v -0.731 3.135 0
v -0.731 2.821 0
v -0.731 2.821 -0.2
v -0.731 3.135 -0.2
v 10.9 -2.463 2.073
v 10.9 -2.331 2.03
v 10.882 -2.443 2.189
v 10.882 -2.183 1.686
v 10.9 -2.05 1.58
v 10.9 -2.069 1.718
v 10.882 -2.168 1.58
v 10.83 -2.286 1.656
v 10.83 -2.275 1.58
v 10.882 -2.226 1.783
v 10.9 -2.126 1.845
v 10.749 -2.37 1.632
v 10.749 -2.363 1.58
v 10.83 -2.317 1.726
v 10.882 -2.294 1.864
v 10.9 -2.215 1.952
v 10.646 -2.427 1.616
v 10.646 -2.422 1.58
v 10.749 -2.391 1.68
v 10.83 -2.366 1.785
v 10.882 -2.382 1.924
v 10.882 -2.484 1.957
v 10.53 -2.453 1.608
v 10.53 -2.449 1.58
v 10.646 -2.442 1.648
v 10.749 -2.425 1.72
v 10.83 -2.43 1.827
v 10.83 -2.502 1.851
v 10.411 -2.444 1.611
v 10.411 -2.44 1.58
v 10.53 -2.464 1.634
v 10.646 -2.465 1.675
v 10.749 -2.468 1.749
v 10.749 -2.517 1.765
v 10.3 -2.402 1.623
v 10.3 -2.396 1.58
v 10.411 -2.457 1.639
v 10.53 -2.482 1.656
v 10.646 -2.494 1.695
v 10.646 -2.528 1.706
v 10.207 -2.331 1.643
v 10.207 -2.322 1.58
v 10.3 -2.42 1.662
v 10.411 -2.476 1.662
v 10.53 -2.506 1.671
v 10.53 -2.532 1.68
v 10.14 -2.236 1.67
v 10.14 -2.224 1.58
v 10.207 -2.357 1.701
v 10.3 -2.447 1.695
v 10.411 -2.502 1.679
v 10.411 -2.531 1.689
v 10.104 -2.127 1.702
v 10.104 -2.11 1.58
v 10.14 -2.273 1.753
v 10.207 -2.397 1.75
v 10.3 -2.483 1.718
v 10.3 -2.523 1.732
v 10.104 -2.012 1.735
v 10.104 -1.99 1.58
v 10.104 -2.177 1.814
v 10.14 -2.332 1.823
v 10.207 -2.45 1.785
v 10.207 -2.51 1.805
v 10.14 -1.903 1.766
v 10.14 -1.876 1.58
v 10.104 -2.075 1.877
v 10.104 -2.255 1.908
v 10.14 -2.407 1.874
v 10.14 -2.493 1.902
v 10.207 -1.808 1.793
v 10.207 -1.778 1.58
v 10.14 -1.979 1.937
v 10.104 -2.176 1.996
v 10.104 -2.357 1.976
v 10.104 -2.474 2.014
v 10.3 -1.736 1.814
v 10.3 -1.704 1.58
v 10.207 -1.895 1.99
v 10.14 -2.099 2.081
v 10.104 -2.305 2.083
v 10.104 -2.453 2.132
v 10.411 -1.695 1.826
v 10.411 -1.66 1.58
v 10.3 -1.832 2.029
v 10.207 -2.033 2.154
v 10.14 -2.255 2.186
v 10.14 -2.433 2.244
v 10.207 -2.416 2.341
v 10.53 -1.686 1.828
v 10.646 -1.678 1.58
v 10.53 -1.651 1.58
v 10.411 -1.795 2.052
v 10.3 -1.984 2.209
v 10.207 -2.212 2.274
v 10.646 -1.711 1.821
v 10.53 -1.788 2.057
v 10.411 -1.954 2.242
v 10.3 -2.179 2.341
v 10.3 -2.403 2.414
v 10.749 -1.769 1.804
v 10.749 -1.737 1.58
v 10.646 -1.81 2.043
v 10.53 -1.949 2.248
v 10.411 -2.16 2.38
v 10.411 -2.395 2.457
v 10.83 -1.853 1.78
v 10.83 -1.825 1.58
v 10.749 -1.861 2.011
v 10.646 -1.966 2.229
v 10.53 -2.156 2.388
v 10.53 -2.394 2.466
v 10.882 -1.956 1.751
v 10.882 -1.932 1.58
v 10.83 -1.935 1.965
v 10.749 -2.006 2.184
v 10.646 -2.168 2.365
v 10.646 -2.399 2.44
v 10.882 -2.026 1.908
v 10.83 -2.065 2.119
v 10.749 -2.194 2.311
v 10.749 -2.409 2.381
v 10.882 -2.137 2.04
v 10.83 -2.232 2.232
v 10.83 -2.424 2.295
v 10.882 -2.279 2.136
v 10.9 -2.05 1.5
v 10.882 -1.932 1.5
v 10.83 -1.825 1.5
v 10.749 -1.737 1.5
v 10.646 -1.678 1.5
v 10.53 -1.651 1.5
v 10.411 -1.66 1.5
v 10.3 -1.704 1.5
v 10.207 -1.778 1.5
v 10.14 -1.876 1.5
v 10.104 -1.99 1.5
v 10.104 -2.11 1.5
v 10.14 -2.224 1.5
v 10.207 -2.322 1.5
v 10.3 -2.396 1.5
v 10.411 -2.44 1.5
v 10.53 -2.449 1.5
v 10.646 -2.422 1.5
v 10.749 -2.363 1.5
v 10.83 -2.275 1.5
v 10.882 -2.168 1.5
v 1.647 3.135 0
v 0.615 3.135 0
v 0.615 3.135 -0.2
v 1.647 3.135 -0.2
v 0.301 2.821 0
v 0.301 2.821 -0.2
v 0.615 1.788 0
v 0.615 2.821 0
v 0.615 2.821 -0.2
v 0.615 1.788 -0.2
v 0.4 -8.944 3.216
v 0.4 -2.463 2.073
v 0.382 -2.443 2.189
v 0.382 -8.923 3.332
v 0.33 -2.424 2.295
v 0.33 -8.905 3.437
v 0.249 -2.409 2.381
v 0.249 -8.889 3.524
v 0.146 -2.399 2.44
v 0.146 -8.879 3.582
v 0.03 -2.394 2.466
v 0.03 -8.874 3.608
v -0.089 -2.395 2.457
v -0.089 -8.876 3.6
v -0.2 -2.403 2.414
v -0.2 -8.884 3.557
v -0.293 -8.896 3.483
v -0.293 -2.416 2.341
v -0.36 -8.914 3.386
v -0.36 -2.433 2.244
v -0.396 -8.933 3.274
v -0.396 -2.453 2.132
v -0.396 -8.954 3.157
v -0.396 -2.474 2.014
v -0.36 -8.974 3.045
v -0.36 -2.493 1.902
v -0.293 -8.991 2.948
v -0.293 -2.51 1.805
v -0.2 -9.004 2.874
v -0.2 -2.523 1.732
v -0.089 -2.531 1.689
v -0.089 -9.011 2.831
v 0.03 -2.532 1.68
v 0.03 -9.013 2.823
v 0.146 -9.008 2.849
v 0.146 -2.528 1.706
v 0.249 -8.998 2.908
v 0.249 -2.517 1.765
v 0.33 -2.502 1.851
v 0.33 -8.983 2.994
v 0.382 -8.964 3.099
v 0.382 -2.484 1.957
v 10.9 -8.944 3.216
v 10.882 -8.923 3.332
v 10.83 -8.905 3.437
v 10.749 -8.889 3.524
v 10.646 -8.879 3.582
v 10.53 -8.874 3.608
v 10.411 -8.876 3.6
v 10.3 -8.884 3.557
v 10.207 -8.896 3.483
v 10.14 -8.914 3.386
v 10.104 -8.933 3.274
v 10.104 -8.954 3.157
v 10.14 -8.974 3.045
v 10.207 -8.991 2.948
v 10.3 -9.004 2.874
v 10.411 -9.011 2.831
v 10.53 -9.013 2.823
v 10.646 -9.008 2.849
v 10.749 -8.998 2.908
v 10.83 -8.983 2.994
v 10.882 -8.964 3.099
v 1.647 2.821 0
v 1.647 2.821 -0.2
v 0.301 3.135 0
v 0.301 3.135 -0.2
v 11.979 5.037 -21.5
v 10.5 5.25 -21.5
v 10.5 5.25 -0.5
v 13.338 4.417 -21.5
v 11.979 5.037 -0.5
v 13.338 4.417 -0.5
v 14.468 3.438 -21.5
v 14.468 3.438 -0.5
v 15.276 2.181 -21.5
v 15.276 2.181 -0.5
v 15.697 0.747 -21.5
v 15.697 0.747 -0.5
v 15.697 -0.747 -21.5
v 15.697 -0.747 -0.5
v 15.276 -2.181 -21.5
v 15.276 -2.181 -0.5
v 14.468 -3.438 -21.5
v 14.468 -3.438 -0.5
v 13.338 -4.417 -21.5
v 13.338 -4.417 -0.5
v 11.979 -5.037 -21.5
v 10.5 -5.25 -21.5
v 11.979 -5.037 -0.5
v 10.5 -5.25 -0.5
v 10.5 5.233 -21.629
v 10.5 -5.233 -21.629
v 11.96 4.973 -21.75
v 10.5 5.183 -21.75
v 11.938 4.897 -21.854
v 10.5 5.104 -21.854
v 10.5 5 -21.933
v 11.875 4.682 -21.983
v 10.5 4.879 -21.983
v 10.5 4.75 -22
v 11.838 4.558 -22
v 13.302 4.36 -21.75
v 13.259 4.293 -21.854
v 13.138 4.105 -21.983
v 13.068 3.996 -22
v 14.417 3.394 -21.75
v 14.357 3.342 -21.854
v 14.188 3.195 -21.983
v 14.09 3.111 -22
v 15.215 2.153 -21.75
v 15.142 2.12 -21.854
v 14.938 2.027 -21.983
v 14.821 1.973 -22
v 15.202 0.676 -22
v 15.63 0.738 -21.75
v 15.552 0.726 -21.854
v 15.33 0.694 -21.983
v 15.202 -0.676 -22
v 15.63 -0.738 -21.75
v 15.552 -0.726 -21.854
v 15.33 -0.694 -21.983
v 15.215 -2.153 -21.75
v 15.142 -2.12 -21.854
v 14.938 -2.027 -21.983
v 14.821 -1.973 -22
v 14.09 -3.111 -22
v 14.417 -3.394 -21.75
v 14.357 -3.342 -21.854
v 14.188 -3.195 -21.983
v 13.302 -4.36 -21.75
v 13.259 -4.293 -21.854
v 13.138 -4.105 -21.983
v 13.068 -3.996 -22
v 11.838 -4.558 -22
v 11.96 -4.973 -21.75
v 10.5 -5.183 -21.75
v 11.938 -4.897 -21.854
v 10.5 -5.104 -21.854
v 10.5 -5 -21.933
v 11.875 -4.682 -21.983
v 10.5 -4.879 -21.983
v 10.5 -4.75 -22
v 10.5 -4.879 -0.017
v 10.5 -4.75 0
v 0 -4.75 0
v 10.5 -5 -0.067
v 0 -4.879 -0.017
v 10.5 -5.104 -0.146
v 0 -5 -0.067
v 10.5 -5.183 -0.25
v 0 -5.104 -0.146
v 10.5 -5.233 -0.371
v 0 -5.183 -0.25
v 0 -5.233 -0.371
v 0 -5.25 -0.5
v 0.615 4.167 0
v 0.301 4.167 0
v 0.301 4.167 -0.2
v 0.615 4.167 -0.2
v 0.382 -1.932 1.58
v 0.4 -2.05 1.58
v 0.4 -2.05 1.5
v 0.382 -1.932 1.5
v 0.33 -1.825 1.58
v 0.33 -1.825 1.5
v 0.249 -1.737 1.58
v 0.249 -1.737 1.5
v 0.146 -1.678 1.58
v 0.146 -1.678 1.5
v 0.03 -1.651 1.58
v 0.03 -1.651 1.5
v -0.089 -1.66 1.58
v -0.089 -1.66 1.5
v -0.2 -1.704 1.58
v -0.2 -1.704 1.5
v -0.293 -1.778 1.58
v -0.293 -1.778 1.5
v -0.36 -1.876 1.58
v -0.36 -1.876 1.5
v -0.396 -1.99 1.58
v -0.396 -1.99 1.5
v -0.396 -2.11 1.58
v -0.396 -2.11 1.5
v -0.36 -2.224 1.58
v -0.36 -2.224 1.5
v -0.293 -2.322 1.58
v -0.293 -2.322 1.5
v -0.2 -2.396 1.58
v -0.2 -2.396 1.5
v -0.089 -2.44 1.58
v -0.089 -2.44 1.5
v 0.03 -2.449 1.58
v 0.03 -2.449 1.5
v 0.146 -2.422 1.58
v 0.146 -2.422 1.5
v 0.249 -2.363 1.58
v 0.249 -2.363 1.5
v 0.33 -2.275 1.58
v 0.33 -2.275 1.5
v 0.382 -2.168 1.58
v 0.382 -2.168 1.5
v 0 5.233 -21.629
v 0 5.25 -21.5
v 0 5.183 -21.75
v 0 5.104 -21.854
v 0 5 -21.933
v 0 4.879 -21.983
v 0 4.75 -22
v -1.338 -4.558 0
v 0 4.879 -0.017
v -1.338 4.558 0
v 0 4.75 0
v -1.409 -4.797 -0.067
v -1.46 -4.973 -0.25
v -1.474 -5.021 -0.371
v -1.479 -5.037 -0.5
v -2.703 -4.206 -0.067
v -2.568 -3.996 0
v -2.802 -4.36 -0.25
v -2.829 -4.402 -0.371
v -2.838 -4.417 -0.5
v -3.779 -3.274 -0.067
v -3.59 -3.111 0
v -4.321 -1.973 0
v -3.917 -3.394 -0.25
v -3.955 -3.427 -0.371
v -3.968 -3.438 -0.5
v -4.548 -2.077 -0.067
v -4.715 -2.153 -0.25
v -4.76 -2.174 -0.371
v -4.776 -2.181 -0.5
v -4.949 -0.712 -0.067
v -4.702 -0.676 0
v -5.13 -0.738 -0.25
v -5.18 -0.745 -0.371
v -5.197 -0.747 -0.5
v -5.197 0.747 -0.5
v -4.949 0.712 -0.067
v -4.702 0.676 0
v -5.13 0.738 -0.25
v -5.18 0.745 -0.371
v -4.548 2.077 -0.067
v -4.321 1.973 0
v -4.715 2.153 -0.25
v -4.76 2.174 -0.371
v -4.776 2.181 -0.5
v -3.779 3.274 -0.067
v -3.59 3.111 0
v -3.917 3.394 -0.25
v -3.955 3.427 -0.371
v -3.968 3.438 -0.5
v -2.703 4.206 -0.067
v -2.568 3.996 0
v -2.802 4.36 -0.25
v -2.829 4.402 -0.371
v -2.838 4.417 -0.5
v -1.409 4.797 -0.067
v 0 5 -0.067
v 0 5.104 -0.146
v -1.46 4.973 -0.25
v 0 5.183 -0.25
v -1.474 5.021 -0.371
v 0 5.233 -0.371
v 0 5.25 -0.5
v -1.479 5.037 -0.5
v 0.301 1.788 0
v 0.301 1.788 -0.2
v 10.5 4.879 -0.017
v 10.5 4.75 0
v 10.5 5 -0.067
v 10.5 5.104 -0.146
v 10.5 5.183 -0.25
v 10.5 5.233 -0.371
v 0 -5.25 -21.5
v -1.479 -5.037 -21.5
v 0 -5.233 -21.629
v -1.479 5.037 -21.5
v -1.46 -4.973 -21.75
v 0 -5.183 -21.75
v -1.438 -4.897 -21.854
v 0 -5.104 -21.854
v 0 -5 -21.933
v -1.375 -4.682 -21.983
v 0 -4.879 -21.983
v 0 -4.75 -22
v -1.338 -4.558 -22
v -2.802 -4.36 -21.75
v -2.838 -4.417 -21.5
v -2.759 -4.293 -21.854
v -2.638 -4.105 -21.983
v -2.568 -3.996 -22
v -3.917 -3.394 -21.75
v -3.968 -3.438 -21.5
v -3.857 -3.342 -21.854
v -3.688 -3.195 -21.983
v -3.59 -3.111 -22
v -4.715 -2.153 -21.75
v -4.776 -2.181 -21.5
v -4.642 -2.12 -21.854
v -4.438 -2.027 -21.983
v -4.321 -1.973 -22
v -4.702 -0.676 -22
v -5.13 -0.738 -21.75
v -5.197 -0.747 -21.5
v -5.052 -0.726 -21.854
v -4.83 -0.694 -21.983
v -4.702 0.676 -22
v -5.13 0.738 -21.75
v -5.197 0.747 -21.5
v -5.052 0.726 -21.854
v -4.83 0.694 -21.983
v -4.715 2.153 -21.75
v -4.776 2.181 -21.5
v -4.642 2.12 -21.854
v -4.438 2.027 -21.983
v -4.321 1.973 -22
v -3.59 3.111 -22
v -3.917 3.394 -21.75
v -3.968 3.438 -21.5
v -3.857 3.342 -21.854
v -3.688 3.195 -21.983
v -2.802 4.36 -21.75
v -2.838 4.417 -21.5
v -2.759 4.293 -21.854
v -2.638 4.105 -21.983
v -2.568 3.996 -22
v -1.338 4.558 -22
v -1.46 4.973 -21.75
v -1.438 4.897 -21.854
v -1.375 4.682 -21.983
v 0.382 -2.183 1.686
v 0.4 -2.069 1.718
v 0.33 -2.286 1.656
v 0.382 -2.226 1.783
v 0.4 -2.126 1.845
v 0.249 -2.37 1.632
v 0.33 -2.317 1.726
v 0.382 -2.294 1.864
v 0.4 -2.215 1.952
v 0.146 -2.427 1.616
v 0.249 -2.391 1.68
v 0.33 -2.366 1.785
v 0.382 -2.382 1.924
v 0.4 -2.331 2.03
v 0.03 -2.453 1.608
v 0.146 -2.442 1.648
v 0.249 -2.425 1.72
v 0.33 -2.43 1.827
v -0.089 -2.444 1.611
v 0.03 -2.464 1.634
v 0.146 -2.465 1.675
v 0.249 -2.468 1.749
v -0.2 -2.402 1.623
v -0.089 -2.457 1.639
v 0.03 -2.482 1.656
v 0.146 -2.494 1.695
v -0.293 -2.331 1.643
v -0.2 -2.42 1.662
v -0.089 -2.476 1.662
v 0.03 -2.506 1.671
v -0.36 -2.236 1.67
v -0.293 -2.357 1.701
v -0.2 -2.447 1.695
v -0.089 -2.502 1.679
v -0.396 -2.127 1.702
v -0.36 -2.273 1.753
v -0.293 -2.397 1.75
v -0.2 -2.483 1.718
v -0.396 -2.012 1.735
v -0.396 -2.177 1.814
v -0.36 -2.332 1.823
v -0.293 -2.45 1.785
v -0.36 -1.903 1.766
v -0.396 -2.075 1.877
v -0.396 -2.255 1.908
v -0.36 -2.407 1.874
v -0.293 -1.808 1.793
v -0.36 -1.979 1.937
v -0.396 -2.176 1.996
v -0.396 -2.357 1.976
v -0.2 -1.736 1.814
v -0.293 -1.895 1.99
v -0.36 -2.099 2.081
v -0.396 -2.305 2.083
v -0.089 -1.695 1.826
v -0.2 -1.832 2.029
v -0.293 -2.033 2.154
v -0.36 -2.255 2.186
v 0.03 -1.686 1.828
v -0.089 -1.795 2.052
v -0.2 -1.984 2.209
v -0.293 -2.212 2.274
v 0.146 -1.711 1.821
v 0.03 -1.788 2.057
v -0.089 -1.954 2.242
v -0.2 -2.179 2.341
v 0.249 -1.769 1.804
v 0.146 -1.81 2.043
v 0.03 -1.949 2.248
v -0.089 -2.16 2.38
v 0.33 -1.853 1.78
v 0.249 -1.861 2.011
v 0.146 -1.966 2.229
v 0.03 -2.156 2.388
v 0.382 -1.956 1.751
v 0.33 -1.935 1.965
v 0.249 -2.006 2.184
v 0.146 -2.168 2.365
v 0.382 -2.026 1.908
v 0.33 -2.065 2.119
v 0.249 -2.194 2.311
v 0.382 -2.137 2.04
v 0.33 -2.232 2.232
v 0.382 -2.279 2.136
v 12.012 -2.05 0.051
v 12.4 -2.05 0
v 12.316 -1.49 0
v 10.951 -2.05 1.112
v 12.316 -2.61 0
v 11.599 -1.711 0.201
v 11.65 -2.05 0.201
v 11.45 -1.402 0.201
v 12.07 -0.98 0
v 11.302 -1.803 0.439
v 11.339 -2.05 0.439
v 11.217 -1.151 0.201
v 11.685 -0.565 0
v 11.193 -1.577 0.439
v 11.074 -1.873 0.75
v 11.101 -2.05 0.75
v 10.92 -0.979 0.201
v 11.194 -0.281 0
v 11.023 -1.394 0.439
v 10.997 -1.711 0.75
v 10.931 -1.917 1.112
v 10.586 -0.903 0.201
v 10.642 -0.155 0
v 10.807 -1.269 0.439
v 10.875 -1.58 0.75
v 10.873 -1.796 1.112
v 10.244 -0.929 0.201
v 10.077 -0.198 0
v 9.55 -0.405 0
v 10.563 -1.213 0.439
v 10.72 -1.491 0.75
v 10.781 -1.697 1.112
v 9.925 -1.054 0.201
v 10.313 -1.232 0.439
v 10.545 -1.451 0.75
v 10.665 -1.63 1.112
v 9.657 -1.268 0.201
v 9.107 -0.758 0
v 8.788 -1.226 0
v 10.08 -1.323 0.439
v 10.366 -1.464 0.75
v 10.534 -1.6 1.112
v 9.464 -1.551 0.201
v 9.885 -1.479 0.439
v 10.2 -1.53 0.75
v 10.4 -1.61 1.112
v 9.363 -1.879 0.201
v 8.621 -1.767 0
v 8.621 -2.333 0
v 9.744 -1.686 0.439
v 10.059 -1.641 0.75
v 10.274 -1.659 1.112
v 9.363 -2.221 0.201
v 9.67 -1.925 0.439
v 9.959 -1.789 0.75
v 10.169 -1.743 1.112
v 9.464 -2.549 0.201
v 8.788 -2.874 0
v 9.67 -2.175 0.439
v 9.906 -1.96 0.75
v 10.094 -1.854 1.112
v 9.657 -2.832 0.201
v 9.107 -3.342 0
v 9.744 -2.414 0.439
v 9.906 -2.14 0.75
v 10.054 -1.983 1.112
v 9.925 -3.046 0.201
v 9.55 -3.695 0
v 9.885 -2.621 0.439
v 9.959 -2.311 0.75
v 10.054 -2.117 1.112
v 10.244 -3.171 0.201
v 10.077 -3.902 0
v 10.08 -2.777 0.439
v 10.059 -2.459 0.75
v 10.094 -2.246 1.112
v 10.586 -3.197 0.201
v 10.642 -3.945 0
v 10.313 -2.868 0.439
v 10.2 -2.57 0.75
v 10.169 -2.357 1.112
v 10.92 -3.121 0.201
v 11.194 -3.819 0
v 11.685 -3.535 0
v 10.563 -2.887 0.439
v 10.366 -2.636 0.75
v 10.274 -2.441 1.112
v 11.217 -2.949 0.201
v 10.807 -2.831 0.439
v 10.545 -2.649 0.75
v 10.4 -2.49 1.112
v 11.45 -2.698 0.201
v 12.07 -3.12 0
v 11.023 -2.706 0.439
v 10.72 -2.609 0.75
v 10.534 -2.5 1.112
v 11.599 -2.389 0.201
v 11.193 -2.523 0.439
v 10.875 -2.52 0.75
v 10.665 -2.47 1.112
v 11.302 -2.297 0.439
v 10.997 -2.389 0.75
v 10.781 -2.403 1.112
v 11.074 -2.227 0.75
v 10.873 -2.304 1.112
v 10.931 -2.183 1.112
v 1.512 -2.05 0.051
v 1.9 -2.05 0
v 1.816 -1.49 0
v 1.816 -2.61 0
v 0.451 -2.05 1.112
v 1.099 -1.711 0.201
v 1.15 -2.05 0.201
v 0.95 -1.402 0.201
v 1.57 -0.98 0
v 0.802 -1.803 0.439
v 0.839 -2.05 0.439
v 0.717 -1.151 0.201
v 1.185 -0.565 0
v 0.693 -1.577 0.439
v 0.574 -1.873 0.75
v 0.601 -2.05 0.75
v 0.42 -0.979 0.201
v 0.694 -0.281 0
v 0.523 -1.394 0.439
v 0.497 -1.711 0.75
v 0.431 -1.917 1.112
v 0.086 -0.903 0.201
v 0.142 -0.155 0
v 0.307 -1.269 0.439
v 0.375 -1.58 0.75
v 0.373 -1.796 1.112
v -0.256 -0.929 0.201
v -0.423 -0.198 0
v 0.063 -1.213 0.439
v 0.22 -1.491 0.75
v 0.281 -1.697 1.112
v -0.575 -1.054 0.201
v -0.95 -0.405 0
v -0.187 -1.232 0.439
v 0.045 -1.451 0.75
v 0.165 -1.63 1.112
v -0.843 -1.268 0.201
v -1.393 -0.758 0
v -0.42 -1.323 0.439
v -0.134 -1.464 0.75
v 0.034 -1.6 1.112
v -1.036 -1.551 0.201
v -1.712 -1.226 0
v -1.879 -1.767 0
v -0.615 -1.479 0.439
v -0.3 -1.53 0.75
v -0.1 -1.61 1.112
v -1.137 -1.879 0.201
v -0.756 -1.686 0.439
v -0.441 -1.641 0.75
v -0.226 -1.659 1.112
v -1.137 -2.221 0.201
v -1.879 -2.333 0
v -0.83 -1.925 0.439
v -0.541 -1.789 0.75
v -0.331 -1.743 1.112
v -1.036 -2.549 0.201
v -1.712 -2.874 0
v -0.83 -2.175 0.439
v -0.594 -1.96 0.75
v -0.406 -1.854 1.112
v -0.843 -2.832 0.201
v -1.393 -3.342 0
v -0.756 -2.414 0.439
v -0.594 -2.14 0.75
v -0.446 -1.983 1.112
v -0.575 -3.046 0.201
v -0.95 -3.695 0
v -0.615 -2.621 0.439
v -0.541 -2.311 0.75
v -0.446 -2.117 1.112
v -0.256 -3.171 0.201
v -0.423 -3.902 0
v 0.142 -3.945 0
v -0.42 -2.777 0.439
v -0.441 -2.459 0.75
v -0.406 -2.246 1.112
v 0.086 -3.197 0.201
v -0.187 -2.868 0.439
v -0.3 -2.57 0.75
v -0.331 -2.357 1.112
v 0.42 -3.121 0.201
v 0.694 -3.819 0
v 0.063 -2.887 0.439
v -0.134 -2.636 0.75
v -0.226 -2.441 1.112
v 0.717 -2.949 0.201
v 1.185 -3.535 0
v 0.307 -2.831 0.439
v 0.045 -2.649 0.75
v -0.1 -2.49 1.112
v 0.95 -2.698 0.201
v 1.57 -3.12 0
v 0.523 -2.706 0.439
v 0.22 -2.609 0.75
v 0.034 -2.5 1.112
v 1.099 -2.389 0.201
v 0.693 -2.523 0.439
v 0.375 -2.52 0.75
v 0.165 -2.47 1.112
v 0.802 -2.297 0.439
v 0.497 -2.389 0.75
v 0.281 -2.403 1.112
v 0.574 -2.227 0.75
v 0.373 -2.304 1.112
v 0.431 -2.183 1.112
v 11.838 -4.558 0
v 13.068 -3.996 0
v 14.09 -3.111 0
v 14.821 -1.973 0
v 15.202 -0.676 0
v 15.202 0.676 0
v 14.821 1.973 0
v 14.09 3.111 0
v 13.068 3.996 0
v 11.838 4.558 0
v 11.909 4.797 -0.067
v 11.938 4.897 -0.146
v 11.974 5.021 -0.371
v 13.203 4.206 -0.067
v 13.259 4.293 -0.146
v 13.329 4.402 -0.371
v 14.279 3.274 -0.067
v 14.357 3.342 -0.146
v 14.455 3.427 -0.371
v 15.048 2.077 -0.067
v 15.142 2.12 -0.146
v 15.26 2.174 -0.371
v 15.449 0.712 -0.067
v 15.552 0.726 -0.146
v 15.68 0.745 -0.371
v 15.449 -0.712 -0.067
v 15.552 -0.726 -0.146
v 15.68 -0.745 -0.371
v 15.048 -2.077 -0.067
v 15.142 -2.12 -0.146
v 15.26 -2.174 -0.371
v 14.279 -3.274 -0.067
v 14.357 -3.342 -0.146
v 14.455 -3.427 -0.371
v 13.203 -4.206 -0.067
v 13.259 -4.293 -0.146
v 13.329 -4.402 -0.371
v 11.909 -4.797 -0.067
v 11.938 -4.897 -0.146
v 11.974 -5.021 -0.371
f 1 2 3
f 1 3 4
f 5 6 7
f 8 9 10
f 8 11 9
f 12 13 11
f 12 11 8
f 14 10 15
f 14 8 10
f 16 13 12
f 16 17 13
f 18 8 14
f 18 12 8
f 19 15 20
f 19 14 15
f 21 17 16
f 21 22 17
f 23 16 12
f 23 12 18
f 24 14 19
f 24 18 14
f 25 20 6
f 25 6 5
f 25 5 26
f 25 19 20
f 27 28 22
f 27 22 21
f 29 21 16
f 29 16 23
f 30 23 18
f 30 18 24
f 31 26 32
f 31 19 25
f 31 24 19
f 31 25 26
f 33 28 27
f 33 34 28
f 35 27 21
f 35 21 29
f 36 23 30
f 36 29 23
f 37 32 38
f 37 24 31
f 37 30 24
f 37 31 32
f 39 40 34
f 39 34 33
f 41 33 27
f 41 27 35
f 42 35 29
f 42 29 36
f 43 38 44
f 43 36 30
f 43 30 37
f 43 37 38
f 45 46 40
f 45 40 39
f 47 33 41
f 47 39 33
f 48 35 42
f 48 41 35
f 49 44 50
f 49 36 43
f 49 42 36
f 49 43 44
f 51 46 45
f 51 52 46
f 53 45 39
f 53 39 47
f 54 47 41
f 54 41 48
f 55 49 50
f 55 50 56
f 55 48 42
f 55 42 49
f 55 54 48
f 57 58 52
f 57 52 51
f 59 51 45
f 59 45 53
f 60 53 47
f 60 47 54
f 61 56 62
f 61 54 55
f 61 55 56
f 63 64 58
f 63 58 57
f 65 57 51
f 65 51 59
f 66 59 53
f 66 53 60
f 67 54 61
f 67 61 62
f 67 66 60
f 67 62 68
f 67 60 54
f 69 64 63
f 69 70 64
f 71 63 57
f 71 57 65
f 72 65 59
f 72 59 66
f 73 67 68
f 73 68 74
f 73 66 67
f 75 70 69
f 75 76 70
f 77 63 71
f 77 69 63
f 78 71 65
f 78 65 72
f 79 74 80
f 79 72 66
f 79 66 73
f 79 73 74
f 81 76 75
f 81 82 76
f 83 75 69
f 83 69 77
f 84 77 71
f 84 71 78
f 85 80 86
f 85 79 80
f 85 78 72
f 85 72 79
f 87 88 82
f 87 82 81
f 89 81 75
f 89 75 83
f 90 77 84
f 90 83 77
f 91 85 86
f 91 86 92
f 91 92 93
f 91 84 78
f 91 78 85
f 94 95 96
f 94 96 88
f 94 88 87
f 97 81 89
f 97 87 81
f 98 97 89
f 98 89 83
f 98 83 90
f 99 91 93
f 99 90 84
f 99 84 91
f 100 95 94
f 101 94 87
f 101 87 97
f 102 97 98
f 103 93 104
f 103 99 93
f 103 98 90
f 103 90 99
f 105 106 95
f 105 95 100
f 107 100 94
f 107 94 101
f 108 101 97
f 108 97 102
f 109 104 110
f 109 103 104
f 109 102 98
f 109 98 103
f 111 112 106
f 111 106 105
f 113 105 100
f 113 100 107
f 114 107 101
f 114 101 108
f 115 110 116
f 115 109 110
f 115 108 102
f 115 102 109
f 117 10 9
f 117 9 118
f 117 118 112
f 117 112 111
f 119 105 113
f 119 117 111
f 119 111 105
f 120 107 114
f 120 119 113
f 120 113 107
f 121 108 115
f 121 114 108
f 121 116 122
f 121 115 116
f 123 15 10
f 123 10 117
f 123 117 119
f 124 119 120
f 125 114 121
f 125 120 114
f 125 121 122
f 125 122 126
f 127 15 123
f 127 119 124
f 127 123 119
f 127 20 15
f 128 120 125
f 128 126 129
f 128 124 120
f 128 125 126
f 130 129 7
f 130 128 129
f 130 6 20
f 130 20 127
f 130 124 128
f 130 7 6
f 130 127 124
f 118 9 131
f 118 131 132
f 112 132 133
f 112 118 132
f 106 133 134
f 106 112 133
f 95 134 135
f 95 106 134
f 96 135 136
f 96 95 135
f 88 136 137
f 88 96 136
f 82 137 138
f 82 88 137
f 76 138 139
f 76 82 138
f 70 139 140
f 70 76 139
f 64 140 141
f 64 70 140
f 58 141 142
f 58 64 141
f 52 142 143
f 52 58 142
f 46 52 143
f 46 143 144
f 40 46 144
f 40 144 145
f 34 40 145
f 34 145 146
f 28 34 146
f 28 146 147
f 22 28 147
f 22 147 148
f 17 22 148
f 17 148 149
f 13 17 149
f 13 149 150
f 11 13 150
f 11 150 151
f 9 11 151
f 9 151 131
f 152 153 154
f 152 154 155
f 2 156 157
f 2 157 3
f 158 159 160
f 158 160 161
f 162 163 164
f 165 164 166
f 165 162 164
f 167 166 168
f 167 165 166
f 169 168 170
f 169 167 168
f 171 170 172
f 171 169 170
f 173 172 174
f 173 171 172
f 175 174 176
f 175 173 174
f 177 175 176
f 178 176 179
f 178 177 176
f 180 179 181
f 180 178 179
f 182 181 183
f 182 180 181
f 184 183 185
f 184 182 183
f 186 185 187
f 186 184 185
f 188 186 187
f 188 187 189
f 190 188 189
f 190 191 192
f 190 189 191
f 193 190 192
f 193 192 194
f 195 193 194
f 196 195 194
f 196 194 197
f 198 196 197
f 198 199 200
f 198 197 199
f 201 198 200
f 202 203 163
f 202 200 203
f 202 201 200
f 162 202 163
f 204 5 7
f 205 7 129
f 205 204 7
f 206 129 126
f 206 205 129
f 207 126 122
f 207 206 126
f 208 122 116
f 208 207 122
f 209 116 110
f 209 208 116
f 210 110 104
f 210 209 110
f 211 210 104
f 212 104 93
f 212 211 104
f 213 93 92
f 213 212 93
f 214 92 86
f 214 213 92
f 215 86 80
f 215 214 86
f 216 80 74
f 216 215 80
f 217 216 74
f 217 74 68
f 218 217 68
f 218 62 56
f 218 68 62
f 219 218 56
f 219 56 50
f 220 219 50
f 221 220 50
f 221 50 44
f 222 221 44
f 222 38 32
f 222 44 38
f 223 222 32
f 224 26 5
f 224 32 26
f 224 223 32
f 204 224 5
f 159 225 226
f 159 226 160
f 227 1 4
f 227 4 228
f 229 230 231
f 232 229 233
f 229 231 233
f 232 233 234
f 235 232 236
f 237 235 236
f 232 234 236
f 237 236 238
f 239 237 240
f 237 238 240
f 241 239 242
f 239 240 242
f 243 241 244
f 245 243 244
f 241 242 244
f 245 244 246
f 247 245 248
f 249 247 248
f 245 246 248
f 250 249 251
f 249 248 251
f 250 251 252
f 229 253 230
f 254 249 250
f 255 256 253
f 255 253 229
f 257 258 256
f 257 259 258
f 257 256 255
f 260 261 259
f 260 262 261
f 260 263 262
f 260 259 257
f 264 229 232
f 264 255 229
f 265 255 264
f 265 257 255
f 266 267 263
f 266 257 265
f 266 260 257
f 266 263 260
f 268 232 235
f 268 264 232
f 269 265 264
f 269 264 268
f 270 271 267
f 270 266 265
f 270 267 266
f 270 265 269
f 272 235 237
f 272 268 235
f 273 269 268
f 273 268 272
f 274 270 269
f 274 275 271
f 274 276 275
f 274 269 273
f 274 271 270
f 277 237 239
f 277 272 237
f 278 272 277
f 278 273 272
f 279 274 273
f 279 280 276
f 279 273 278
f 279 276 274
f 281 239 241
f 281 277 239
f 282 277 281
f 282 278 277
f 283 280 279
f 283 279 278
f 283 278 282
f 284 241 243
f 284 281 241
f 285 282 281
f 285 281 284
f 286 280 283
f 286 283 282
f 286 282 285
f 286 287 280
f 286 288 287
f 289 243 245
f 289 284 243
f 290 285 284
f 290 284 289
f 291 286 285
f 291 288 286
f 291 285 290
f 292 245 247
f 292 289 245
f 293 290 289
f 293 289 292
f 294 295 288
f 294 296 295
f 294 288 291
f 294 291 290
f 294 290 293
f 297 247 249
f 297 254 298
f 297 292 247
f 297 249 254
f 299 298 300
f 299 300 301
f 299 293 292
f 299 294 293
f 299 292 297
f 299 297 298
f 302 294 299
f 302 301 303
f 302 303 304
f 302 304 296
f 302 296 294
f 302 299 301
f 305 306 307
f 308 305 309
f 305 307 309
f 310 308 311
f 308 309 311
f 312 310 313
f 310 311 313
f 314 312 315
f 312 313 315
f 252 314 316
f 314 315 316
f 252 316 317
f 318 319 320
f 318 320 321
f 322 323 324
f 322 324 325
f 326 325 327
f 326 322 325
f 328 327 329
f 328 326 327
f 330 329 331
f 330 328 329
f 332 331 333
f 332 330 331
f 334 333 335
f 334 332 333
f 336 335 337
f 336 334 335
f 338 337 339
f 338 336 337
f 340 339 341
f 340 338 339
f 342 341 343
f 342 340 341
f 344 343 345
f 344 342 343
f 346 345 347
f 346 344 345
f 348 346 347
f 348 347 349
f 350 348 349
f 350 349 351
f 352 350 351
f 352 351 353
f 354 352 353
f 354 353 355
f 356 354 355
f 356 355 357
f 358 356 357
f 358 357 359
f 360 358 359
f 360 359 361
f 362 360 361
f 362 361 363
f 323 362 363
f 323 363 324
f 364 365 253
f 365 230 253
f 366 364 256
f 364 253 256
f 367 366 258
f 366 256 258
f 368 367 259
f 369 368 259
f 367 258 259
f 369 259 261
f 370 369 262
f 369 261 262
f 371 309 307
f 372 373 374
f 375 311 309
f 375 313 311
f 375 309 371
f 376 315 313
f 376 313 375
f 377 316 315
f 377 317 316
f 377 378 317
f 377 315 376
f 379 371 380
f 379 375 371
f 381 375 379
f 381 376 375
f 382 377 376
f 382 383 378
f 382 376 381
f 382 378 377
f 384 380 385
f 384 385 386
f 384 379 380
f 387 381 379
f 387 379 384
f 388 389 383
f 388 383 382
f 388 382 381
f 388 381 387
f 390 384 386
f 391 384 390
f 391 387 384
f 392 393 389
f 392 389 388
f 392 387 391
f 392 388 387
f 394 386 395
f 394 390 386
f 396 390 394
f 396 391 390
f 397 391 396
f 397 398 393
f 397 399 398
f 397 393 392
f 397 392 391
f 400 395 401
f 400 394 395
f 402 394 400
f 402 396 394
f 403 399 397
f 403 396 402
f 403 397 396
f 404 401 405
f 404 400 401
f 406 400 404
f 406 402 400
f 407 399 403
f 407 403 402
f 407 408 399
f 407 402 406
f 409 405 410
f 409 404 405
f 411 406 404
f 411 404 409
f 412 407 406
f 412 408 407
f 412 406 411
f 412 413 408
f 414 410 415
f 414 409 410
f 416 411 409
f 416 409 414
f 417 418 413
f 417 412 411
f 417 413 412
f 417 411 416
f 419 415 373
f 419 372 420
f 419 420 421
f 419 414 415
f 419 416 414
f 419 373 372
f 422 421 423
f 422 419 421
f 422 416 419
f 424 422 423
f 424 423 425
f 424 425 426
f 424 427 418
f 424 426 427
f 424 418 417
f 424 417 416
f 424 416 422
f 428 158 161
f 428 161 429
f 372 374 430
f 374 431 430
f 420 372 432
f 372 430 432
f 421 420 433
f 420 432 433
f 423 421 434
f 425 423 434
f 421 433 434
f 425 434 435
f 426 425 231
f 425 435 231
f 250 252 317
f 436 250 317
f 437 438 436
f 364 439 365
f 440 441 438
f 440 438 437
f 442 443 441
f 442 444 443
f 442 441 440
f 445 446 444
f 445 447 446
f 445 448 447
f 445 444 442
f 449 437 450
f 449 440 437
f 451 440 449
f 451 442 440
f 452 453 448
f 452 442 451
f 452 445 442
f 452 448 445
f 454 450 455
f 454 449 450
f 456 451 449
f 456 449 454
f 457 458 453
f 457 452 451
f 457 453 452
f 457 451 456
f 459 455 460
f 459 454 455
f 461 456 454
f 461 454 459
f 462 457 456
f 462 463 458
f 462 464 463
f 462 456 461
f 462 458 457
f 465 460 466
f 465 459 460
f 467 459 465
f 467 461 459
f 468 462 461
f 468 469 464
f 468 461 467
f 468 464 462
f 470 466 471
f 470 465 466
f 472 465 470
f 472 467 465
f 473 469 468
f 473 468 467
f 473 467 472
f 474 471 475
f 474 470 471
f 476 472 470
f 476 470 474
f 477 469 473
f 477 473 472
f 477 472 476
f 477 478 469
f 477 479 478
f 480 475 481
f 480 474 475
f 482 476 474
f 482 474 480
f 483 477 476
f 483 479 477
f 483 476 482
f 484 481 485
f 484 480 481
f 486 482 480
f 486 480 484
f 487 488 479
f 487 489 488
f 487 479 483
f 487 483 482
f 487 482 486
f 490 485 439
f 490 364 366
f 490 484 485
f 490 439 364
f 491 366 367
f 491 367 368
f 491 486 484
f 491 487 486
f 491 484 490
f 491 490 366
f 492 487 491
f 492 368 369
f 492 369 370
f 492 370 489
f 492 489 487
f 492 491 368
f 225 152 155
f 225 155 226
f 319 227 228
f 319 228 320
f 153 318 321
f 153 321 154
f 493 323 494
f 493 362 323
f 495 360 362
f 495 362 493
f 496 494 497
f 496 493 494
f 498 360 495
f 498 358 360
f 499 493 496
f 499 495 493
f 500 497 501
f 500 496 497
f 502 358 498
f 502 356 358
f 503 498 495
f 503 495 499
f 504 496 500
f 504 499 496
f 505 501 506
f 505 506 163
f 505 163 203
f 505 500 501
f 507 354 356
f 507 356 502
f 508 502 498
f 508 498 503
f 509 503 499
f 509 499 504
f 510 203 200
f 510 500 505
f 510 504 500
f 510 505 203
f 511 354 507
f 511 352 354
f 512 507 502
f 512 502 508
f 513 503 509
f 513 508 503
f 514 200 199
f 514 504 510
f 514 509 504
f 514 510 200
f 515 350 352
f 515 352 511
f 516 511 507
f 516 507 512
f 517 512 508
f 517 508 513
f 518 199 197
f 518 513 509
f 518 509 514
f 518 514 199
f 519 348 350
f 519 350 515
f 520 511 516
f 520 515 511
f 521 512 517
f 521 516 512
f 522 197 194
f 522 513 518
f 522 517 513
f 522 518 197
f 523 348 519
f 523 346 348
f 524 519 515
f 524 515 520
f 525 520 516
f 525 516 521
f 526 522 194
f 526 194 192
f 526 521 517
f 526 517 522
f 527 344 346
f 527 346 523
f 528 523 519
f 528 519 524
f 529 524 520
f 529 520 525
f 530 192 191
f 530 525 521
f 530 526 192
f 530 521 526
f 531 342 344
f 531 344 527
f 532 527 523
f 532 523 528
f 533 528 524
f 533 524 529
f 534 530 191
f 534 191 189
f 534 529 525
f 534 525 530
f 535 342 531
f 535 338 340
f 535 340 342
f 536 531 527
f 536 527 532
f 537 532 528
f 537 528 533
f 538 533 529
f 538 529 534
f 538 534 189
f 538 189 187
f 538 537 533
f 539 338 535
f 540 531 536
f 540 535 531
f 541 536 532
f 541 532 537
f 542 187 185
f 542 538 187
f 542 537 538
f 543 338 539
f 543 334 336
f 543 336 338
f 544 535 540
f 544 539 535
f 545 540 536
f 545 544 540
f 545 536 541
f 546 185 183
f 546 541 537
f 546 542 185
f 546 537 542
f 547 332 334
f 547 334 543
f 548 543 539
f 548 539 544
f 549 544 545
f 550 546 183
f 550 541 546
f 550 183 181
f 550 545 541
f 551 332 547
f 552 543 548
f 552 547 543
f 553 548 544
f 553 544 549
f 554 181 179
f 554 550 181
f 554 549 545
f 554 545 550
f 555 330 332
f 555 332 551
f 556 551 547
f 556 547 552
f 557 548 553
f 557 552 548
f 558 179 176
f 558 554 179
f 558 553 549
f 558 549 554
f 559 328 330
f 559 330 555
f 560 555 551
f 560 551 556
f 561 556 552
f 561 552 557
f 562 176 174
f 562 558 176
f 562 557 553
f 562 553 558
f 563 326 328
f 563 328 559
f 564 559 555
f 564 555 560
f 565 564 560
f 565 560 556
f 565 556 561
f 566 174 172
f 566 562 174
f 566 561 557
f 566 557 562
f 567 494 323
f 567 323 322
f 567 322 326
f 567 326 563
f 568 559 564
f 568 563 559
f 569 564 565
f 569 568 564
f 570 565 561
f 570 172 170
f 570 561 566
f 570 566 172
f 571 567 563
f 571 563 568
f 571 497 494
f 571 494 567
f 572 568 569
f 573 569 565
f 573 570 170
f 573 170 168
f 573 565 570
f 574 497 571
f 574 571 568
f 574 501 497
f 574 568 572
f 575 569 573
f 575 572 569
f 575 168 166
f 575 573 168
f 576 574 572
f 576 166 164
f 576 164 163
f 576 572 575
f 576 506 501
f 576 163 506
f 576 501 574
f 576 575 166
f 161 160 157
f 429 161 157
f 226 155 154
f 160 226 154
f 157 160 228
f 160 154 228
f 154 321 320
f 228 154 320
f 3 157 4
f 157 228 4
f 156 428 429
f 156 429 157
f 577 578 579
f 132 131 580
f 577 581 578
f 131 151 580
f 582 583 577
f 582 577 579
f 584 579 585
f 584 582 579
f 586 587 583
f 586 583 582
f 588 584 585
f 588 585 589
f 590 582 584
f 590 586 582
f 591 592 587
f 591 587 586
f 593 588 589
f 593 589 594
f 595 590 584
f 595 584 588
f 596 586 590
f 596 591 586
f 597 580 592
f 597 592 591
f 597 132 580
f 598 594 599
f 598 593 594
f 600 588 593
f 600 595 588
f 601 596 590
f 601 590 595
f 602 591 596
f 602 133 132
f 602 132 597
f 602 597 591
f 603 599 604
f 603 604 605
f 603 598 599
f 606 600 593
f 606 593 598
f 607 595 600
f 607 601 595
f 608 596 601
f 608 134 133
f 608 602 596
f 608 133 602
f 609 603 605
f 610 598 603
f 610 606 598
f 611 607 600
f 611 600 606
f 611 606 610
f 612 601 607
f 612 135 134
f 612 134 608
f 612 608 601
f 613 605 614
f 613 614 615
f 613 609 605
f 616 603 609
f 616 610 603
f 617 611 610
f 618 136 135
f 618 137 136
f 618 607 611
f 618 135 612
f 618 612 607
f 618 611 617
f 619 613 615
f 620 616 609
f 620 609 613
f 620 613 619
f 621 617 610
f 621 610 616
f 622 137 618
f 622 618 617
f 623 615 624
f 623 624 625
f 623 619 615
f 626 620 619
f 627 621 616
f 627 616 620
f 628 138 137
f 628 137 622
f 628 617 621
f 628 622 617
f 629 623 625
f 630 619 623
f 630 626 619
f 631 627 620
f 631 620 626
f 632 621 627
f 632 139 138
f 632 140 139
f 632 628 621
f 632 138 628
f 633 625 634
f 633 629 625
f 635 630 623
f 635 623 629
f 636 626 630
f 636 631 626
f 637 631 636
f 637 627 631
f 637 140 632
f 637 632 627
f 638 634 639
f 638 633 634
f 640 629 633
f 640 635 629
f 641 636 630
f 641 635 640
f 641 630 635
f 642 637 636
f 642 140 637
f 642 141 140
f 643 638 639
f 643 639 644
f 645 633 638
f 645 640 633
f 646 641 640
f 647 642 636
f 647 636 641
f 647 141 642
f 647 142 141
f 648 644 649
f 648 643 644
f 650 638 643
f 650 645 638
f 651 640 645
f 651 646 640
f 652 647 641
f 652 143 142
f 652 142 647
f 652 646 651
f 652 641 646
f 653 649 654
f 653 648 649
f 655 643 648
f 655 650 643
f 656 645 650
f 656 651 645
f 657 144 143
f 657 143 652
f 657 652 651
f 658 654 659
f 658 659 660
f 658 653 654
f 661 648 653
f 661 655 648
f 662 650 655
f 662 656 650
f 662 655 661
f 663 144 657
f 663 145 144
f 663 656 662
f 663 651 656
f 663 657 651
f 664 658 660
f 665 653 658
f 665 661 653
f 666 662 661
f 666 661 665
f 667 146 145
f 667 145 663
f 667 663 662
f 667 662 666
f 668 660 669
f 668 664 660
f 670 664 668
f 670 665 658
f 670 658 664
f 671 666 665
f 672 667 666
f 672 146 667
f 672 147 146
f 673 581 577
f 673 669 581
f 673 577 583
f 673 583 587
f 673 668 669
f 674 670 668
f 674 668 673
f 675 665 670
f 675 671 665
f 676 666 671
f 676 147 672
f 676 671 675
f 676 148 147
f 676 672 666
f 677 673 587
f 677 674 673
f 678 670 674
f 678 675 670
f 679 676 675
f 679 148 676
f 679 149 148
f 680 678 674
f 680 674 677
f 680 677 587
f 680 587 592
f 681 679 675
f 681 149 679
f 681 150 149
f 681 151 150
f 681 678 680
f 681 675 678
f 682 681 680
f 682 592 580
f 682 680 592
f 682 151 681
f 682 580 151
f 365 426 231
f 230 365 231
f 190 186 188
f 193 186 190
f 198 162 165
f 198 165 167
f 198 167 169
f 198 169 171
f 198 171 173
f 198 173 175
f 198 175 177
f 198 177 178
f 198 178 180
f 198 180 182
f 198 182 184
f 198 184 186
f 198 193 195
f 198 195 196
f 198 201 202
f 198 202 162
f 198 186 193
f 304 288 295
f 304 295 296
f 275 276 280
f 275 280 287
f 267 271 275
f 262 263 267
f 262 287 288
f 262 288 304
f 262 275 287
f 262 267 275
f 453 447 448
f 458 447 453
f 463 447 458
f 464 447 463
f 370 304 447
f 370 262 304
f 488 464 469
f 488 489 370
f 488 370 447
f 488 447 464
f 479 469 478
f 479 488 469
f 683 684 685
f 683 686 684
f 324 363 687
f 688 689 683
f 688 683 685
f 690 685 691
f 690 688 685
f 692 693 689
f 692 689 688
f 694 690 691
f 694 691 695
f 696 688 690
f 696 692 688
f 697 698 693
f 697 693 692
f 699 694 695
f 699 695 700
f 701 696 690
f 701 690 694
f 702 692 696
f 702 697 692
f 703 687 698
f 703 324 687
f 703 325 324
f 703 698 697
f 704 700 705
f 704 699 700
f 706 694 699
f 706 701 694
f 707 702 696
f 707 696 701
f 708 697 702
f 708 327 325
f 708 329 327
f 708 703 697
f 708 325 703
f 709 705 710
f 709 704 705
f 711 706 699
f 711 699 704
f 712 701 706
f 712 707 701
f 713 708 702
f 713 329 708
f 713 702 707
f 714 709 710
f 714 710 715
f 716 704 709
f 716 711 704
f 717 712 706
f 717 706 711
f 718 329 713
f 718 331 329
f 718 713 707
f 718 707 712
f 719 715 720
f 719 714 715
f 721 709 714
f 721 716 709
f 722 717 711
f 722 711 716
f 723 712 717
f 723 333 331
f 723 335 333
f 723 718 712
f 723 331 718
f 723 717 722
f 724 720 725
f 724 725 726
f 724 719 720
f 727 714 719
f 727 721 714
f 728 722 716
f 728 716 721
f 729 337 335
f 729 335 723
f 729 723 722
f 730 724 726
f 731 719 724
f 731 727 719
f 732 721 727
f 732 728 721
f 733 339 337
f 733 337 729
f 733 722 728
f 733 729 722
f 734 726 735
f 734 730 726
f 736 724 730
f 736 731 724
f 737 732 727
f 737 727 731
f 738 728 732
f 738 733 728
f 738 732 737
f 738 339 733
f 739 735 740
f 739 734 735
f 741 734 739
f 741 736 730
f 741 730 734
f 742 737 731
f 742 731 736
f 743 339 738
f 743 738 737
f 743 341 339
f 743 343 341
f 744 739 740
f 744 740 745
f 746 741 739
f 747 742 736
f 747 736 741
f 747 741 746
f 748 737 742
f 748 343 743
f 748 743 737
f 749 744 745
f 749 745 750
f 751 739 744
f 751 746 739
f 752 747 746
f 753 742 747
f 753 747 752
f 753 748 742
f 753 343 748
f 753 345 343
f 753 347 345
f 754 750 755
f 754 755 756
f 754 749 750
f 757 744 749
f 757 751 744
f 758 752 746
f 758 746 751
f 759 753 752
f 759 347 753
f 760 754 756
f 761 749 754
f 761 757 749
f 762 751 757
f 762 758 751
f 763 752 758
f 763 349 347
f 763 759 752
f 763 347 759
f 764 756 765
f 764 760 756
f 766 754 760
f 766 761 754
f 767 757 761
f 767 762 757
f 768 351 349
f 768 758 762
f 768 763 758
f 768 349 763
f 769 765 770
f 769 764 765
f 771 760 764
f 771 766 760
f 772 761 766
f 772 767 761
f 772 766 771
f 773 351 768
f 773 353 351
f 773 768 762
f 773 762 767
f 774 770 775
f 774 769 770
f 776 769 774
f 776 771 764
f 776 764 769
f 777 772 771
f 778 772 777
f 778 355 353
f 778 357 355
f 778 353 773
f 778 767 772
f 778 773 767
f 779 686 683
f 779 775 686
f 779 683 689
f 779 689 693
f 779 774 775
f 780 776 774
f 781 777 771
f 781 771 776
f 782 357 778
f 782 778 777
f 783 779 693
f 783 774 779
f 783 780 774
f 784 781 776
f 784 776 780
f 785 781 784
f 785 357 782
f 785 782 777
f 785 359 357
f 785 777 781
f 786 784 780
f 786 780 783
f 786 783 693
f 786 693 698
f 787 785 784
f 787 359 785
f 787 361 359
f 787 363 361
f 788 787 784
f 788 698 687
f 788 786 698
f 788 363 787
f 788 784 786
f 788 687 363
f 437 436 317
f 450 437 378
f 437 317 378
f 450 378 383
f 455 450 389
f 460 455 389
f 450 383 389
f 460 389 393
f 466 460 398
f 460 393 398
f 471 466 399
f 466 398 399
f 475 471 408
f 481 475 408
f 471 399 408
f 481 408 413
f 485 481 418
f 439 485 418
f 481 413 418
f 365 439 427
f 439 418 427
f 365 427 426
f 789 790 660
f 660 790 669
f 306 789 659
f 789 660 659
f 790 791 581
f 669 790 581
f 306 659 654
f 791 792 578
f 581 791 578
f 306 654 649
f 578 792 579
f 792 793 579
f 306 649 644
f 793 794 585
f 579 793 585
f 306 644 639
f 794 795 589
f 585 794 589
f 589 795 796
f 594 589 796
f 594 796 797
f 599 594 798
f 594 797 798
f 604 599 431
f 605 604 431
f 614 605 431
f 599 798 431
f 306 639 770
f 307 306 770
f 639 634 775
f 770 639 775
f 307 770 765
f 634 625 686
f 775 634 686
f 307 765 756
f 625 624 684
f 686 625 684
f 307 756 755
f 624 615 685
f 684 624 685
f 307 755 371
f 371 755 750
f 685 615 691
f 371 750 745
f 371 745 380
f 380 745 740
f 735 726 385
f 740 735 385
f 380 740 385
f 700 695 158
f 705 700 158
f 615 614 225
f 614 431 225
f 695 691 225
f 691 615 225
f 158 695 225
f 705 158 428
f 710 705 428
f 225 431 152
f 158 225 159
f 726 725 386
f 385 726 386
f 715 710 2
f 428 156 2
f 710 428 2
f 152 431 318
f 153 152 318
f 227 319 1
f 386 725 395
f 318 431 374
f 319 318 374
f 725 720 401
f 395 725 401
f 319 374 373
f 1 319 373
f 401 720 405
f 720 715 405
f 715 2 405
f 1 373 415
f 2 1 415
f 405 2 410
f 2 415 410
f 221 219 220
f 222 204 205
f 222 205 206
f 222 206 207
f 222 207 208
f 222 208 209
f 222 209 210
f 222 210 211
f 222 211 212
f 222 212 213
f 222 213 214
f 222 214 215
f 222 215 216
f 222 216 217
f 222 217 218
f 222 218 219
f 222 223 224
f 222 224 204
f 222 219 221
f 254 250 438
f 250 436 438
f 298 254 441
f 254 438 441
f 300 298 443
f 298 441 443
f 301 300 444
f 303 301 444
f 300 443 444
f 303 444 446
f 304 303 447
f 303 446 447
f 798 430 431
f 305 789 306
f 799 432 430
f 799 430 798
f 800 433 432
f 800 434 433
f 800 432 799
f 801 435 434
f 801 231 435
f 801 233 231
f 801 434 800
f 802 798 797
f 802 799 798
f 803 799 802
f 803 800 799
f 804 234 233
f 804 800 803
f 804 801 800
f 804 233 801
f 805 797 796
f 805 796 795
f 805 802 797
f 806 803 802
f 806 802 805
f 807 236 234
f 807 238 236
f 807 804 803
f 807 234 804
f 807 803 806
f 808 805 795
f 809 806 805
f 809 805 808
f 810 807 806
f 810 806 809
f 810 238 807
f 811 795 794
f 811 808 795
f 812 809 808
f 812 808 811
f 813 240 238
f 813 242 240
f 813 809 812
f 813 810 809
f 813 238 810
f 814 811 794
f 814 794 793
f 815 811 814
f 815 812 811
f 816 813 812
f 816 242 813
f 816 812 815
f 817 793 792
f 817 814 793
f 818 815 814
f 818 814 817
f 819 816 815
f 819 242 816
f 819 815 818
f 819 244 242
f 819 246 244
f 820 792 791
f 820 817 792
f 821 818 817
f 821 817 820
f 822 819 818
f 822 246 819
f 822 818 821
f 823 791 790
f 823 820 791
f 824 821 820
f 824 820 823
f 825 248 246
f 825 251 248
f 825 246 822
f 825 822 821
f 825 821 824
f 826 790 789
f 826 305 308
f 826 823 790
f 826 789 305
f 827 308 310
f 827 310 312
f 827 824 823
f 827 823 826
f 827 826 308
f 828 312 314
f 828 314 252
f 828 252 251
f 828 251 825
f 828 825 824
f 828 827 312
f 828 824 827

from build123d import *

# Parameters (mm, degrees)
BOSS_EXTRUDE1_DEPTH = 22
SKETCH2_R           = 0.4
FILLET1_R           = 1.5
FILLET2_R           = 0.5
CUT_EXTRUDE1_DEPTH  = 0.2


with BuildPart() as part:
    # Sketch1 → Boss-Extrude1 (new body)
    with BuildSketch(Plane.XY):
        with BuildLine():
            Line((0, 5.25), (10.5, 5.25))
            ThreePointArc((10.5, 5.25), (15.75, 0), (10.5, -5.25))
            Line((10.5, -5.25), (0, -5.25))
            ThreePointArc((0, -5.25), (-5.25, 0), (0, 5.25))
        make_face()
    extrude(amount=-BOSS_EXTRUDE1_DEPTH)

    # Sweep1: sweep along a path in Sketch3
    with BuildLine(Plane.YZ) as sweep1_path:
        Line((-2.05, 0), (-2.05, 1.580450184))
        ThreePointArc((-2.05, 1.580450184), (-2.166977778, 1.901843989), (-2.463175911, 2.072854061))
        Line((-2.463175911, 2.072854061), (-8.943654271, 3.215537244))
    # Sketch2 → Sweep1 (sweep)
    with BuildSketch(Plane.XY):
        with Locations((0, -2.05)):
            Circle(SKETCH2_R)
        with Locations((10.5, -2.05)):
            Circle(SKETCH2_R)
    sweep(path=sweep1_path.line)

    # Fillet1
    fillet1_edges = [part.edges().sort_by_distance(p)[0] for p in [
        (-0.4, -2.05, 0),
        (10.1, -2.05, 0),
    ]]
    fillet(fillet1_edges, radius=FILLET1_R)

    # Fillet2
    fillet2_edges = [part.edges().sort_by_distance(p)[0] for p in [
        (15.75, 0, -22),
        (5.25, 5.25, -22),
        (-5.25, 0, -22),
        (5.25, 5.25, 0),
        (15.75, 0, 0),
        (5.25, -5.25, 0),
        (-5.25, 0, 0),
        (5.25, -5.25, -22),
    ]]
    fillet(fillet2_edges, radius=FILLET2_R)

    # Sketch4 → Cut-Extrude1 (cut)
    with BuildSketch(Plane.XY):
        Polygon((0.301282051, 3.134615385), (0.301282051, 4.166666667), (0.615384615, 4.166666667), (0.615384615, 3.134615385), (1.647435897, 3.134615385), (1.647435897, 2.820512821), (0.615384615, 2.820512821), (0.615384615, 1.788461538), (0.301282051, 1.788461538), (0.301282051, 2.820512821), (-0.730769231, 2.820512821), (-0.730769231, 3.134615385), align=None)
    extrude(amount=-CUT_EXTRUDE1_DEPTH, mode=Mode.SUBTRACT)


solid = part.part
